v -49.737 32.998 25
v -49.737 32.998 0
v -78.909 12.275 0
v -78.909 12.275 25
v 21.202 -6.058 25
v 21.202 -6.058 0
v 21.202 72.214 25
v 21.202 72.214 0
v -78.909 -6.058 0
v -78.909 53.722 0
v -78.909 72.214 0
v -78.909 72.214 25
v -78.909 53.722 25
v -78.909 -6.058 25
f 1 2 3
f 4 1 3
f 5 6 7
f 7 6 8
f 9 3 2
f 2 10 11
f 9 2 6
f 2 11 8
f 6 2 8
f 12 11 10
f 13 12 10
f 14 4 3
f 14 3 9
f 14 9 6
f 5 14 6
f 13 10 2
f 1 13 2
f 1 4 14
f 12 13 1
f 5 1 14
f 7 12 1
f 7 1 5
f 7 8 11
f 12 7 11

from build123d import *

# Parameters (mm, degrees)
F0_W     = 23.5931184143
F0_H     = 41.4473693818
F1_DEPTH = 25
F2_DEPTH = 25


with BuildPart() as f1:
    # F0 (on Top) → F1 (new body)
    with BuildSketch(Plane.XY):
        Polygon((-2.3911930621, 12.2747989371), (-20.5642711371, 12.2747989371), (-78.9094138891, 12.2747989371), (-78.9094138891, -6.0576931573), (21.2019253522, -6.0576931573), (21.2019253522, 12.2747989371), align=None)
        with Locations((9.4053661451, 32.998483628)):
            Rectangle(F0_W, F0_H)
        Polygon((-78.9094138891, 53.7221683189), (-20.5642711371, 53.7221683189), (-2.3911930621, 53.7221683189), (21.2019253522, 53.7221683189), (21.2019253522, 72.2140744328), (-78.9094138891, 72.2140744328), align=None)
        Polygon((-78.9094138891, 12.2747989371), (-20.5642711371, 12.2747989371), (-49.7368425131, 32.998483628), align=None)
    extrude(amount=F1_DEPTH)

    # F0 (on Top) → F2 (join)
    with BuildSketch(Plane.XY):
        Polygon((-78.9094138891, 53.7221683189), (-49.7368425131, 32.998483628), (-20.5642711371, 53.7221683189), align=None)
        Polygon((-49.7368425131, 32.998483628), (-20.5642711371, 12.2747989371), (-2.3911930621, 12.2747989371), (-2.3911930621, 53.7221683189), (-20.5642711371, 53.7221683189), align=None)
    extrude(amount=F2_DEPTH)


solid = f1.part
